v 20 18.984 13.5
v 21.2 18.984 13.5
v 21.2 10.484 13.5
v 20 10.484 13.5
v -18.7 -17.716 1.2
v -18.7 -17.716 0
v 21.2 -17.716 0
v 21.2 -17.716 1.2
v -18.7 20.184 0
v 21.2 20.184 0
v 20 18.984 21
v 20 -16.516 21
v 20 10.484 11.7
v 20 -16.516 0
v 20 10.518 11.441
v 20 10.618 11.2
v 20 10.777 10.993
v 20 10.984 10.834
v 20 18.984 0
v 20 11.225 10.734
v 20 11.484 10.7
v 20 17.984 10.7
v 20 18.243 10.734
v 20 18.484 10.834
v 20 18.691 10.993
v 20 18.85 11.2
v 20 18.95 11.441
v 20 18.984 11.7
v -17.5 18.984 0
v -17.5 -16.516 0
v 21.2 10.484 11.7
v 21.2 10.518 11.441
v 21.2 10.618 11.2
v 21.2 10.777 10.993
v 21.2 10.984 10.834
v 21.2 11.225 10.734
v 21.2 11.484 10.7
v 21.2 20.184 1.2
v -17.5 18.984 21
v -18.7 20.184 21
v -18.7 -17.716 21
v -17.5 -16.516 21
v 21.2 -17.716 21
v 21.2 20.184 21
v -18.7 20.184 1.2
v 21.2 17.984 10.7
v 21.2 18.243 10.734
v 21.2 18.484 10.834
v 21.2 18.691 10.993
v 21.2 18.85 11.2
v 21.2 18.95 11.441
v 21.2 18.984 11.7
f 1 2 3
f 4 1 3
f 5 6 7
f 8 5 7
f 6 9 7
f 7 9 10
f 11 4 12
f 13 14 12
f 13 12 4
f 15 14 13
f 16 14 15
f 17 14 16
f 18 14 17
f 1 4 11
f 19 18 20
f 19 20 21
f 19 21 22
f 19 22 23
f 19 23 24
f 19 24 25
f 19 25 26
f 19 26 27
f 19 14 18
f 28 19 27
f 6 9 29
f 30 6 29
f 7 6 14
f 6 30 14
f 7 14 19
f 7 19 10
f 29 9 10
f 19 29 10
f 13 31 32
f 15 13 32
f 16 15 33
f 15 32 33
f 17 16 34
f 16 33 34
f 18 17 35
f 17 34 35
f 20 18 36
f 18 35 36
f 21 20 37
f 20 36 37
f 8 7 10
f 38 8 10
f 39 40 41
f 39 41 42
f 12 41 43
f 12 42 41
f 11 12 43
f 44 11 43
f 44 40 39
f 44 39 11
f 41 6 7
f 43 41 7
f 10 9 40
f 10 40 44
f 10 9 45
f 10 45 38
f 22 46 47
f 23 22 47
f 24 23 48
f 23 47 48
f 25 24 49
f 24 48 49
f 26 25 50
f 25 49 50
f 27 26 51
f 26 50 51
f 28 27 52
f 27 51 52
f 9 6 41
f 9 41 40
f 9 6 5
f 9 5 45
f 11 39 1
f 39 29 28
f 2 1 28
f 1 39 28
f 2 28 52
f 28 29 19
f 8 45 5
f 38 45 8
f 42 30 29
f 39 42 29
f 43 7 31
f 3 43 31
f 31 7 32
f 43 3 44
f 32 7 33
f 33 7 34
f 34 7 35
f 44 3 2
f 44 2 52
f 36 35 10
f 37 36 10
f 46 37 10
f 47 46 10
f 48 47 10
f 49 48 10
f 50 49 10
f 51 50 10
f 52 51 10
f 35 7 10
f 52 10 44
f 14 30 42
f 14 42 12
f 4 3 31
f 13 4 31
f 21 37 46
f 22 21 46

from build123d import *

# Parameters (mm, degrees)
F0_W     = 39.9
F0_H     = 37.9
F0_W_2   = 37.5
F0_H_2   = 35.5
F1_DEPTH = 1.2
F2_DEPTH = 21
F4_DEPTH = 2


with BuildPart() as f1:
    # F0 (on Top) → F1 (new body)
    with BuildSketch(Plane.XY):
        with Locations((1.249999, 1.234054)):
            Rectangle(F0_W, F0_H)
        with Locations((1.249999, 1.234054)):
            Rectangle(F0_W_2, F0_H_2, mode=Mode.SUBTRACT)
        with Locations((1.249999, 1.234054)):
            Rectangle(F0_W_2, F0_H_2)
    extrude(amount=F1_DEPTH)


with BuildPart() as f2:
    # F0 (on Top) → F2 (new body)
    with BuildSketch(Plane.XY):
        with Locations((1.249999, 1.234054)):
            Rectangle(F0_W, F0_H)
        with Locations((1.249999, 1.234054)):
            Rectangle(F0_W_2, F0_H_2, mode=Mode.SUBTRACT)
    extrude(amount=F2_DEPTH)

    # F3 (on face) → F4 (cut)
    with BuildSketch(Plane.YZ.offset(21.199999)):
        with BuildLine():
            ThreePointArc((10.484054, 11.7), (10.776948, 10.992893), (11.484054, 10.7))
            Line((11.484054, 10.7), (17.984054, 10.7))
            ThreePointArc((17.984054, 10.7), (18.691161, 10.992893), (18.984054, 11.7))
            Line((18.984054, 11.7), (18.984054, 13.5))
            Line((18.984054, 13.5), (10.484054, 13.5))
            Line((10.484054, 13.5), (10.484054, 11.7))
        make_face()
    extrude(amount=-F4_DEPTH, mode=Mode.SUBTRACT)


solid = Compound([f1.part, f2.part])
